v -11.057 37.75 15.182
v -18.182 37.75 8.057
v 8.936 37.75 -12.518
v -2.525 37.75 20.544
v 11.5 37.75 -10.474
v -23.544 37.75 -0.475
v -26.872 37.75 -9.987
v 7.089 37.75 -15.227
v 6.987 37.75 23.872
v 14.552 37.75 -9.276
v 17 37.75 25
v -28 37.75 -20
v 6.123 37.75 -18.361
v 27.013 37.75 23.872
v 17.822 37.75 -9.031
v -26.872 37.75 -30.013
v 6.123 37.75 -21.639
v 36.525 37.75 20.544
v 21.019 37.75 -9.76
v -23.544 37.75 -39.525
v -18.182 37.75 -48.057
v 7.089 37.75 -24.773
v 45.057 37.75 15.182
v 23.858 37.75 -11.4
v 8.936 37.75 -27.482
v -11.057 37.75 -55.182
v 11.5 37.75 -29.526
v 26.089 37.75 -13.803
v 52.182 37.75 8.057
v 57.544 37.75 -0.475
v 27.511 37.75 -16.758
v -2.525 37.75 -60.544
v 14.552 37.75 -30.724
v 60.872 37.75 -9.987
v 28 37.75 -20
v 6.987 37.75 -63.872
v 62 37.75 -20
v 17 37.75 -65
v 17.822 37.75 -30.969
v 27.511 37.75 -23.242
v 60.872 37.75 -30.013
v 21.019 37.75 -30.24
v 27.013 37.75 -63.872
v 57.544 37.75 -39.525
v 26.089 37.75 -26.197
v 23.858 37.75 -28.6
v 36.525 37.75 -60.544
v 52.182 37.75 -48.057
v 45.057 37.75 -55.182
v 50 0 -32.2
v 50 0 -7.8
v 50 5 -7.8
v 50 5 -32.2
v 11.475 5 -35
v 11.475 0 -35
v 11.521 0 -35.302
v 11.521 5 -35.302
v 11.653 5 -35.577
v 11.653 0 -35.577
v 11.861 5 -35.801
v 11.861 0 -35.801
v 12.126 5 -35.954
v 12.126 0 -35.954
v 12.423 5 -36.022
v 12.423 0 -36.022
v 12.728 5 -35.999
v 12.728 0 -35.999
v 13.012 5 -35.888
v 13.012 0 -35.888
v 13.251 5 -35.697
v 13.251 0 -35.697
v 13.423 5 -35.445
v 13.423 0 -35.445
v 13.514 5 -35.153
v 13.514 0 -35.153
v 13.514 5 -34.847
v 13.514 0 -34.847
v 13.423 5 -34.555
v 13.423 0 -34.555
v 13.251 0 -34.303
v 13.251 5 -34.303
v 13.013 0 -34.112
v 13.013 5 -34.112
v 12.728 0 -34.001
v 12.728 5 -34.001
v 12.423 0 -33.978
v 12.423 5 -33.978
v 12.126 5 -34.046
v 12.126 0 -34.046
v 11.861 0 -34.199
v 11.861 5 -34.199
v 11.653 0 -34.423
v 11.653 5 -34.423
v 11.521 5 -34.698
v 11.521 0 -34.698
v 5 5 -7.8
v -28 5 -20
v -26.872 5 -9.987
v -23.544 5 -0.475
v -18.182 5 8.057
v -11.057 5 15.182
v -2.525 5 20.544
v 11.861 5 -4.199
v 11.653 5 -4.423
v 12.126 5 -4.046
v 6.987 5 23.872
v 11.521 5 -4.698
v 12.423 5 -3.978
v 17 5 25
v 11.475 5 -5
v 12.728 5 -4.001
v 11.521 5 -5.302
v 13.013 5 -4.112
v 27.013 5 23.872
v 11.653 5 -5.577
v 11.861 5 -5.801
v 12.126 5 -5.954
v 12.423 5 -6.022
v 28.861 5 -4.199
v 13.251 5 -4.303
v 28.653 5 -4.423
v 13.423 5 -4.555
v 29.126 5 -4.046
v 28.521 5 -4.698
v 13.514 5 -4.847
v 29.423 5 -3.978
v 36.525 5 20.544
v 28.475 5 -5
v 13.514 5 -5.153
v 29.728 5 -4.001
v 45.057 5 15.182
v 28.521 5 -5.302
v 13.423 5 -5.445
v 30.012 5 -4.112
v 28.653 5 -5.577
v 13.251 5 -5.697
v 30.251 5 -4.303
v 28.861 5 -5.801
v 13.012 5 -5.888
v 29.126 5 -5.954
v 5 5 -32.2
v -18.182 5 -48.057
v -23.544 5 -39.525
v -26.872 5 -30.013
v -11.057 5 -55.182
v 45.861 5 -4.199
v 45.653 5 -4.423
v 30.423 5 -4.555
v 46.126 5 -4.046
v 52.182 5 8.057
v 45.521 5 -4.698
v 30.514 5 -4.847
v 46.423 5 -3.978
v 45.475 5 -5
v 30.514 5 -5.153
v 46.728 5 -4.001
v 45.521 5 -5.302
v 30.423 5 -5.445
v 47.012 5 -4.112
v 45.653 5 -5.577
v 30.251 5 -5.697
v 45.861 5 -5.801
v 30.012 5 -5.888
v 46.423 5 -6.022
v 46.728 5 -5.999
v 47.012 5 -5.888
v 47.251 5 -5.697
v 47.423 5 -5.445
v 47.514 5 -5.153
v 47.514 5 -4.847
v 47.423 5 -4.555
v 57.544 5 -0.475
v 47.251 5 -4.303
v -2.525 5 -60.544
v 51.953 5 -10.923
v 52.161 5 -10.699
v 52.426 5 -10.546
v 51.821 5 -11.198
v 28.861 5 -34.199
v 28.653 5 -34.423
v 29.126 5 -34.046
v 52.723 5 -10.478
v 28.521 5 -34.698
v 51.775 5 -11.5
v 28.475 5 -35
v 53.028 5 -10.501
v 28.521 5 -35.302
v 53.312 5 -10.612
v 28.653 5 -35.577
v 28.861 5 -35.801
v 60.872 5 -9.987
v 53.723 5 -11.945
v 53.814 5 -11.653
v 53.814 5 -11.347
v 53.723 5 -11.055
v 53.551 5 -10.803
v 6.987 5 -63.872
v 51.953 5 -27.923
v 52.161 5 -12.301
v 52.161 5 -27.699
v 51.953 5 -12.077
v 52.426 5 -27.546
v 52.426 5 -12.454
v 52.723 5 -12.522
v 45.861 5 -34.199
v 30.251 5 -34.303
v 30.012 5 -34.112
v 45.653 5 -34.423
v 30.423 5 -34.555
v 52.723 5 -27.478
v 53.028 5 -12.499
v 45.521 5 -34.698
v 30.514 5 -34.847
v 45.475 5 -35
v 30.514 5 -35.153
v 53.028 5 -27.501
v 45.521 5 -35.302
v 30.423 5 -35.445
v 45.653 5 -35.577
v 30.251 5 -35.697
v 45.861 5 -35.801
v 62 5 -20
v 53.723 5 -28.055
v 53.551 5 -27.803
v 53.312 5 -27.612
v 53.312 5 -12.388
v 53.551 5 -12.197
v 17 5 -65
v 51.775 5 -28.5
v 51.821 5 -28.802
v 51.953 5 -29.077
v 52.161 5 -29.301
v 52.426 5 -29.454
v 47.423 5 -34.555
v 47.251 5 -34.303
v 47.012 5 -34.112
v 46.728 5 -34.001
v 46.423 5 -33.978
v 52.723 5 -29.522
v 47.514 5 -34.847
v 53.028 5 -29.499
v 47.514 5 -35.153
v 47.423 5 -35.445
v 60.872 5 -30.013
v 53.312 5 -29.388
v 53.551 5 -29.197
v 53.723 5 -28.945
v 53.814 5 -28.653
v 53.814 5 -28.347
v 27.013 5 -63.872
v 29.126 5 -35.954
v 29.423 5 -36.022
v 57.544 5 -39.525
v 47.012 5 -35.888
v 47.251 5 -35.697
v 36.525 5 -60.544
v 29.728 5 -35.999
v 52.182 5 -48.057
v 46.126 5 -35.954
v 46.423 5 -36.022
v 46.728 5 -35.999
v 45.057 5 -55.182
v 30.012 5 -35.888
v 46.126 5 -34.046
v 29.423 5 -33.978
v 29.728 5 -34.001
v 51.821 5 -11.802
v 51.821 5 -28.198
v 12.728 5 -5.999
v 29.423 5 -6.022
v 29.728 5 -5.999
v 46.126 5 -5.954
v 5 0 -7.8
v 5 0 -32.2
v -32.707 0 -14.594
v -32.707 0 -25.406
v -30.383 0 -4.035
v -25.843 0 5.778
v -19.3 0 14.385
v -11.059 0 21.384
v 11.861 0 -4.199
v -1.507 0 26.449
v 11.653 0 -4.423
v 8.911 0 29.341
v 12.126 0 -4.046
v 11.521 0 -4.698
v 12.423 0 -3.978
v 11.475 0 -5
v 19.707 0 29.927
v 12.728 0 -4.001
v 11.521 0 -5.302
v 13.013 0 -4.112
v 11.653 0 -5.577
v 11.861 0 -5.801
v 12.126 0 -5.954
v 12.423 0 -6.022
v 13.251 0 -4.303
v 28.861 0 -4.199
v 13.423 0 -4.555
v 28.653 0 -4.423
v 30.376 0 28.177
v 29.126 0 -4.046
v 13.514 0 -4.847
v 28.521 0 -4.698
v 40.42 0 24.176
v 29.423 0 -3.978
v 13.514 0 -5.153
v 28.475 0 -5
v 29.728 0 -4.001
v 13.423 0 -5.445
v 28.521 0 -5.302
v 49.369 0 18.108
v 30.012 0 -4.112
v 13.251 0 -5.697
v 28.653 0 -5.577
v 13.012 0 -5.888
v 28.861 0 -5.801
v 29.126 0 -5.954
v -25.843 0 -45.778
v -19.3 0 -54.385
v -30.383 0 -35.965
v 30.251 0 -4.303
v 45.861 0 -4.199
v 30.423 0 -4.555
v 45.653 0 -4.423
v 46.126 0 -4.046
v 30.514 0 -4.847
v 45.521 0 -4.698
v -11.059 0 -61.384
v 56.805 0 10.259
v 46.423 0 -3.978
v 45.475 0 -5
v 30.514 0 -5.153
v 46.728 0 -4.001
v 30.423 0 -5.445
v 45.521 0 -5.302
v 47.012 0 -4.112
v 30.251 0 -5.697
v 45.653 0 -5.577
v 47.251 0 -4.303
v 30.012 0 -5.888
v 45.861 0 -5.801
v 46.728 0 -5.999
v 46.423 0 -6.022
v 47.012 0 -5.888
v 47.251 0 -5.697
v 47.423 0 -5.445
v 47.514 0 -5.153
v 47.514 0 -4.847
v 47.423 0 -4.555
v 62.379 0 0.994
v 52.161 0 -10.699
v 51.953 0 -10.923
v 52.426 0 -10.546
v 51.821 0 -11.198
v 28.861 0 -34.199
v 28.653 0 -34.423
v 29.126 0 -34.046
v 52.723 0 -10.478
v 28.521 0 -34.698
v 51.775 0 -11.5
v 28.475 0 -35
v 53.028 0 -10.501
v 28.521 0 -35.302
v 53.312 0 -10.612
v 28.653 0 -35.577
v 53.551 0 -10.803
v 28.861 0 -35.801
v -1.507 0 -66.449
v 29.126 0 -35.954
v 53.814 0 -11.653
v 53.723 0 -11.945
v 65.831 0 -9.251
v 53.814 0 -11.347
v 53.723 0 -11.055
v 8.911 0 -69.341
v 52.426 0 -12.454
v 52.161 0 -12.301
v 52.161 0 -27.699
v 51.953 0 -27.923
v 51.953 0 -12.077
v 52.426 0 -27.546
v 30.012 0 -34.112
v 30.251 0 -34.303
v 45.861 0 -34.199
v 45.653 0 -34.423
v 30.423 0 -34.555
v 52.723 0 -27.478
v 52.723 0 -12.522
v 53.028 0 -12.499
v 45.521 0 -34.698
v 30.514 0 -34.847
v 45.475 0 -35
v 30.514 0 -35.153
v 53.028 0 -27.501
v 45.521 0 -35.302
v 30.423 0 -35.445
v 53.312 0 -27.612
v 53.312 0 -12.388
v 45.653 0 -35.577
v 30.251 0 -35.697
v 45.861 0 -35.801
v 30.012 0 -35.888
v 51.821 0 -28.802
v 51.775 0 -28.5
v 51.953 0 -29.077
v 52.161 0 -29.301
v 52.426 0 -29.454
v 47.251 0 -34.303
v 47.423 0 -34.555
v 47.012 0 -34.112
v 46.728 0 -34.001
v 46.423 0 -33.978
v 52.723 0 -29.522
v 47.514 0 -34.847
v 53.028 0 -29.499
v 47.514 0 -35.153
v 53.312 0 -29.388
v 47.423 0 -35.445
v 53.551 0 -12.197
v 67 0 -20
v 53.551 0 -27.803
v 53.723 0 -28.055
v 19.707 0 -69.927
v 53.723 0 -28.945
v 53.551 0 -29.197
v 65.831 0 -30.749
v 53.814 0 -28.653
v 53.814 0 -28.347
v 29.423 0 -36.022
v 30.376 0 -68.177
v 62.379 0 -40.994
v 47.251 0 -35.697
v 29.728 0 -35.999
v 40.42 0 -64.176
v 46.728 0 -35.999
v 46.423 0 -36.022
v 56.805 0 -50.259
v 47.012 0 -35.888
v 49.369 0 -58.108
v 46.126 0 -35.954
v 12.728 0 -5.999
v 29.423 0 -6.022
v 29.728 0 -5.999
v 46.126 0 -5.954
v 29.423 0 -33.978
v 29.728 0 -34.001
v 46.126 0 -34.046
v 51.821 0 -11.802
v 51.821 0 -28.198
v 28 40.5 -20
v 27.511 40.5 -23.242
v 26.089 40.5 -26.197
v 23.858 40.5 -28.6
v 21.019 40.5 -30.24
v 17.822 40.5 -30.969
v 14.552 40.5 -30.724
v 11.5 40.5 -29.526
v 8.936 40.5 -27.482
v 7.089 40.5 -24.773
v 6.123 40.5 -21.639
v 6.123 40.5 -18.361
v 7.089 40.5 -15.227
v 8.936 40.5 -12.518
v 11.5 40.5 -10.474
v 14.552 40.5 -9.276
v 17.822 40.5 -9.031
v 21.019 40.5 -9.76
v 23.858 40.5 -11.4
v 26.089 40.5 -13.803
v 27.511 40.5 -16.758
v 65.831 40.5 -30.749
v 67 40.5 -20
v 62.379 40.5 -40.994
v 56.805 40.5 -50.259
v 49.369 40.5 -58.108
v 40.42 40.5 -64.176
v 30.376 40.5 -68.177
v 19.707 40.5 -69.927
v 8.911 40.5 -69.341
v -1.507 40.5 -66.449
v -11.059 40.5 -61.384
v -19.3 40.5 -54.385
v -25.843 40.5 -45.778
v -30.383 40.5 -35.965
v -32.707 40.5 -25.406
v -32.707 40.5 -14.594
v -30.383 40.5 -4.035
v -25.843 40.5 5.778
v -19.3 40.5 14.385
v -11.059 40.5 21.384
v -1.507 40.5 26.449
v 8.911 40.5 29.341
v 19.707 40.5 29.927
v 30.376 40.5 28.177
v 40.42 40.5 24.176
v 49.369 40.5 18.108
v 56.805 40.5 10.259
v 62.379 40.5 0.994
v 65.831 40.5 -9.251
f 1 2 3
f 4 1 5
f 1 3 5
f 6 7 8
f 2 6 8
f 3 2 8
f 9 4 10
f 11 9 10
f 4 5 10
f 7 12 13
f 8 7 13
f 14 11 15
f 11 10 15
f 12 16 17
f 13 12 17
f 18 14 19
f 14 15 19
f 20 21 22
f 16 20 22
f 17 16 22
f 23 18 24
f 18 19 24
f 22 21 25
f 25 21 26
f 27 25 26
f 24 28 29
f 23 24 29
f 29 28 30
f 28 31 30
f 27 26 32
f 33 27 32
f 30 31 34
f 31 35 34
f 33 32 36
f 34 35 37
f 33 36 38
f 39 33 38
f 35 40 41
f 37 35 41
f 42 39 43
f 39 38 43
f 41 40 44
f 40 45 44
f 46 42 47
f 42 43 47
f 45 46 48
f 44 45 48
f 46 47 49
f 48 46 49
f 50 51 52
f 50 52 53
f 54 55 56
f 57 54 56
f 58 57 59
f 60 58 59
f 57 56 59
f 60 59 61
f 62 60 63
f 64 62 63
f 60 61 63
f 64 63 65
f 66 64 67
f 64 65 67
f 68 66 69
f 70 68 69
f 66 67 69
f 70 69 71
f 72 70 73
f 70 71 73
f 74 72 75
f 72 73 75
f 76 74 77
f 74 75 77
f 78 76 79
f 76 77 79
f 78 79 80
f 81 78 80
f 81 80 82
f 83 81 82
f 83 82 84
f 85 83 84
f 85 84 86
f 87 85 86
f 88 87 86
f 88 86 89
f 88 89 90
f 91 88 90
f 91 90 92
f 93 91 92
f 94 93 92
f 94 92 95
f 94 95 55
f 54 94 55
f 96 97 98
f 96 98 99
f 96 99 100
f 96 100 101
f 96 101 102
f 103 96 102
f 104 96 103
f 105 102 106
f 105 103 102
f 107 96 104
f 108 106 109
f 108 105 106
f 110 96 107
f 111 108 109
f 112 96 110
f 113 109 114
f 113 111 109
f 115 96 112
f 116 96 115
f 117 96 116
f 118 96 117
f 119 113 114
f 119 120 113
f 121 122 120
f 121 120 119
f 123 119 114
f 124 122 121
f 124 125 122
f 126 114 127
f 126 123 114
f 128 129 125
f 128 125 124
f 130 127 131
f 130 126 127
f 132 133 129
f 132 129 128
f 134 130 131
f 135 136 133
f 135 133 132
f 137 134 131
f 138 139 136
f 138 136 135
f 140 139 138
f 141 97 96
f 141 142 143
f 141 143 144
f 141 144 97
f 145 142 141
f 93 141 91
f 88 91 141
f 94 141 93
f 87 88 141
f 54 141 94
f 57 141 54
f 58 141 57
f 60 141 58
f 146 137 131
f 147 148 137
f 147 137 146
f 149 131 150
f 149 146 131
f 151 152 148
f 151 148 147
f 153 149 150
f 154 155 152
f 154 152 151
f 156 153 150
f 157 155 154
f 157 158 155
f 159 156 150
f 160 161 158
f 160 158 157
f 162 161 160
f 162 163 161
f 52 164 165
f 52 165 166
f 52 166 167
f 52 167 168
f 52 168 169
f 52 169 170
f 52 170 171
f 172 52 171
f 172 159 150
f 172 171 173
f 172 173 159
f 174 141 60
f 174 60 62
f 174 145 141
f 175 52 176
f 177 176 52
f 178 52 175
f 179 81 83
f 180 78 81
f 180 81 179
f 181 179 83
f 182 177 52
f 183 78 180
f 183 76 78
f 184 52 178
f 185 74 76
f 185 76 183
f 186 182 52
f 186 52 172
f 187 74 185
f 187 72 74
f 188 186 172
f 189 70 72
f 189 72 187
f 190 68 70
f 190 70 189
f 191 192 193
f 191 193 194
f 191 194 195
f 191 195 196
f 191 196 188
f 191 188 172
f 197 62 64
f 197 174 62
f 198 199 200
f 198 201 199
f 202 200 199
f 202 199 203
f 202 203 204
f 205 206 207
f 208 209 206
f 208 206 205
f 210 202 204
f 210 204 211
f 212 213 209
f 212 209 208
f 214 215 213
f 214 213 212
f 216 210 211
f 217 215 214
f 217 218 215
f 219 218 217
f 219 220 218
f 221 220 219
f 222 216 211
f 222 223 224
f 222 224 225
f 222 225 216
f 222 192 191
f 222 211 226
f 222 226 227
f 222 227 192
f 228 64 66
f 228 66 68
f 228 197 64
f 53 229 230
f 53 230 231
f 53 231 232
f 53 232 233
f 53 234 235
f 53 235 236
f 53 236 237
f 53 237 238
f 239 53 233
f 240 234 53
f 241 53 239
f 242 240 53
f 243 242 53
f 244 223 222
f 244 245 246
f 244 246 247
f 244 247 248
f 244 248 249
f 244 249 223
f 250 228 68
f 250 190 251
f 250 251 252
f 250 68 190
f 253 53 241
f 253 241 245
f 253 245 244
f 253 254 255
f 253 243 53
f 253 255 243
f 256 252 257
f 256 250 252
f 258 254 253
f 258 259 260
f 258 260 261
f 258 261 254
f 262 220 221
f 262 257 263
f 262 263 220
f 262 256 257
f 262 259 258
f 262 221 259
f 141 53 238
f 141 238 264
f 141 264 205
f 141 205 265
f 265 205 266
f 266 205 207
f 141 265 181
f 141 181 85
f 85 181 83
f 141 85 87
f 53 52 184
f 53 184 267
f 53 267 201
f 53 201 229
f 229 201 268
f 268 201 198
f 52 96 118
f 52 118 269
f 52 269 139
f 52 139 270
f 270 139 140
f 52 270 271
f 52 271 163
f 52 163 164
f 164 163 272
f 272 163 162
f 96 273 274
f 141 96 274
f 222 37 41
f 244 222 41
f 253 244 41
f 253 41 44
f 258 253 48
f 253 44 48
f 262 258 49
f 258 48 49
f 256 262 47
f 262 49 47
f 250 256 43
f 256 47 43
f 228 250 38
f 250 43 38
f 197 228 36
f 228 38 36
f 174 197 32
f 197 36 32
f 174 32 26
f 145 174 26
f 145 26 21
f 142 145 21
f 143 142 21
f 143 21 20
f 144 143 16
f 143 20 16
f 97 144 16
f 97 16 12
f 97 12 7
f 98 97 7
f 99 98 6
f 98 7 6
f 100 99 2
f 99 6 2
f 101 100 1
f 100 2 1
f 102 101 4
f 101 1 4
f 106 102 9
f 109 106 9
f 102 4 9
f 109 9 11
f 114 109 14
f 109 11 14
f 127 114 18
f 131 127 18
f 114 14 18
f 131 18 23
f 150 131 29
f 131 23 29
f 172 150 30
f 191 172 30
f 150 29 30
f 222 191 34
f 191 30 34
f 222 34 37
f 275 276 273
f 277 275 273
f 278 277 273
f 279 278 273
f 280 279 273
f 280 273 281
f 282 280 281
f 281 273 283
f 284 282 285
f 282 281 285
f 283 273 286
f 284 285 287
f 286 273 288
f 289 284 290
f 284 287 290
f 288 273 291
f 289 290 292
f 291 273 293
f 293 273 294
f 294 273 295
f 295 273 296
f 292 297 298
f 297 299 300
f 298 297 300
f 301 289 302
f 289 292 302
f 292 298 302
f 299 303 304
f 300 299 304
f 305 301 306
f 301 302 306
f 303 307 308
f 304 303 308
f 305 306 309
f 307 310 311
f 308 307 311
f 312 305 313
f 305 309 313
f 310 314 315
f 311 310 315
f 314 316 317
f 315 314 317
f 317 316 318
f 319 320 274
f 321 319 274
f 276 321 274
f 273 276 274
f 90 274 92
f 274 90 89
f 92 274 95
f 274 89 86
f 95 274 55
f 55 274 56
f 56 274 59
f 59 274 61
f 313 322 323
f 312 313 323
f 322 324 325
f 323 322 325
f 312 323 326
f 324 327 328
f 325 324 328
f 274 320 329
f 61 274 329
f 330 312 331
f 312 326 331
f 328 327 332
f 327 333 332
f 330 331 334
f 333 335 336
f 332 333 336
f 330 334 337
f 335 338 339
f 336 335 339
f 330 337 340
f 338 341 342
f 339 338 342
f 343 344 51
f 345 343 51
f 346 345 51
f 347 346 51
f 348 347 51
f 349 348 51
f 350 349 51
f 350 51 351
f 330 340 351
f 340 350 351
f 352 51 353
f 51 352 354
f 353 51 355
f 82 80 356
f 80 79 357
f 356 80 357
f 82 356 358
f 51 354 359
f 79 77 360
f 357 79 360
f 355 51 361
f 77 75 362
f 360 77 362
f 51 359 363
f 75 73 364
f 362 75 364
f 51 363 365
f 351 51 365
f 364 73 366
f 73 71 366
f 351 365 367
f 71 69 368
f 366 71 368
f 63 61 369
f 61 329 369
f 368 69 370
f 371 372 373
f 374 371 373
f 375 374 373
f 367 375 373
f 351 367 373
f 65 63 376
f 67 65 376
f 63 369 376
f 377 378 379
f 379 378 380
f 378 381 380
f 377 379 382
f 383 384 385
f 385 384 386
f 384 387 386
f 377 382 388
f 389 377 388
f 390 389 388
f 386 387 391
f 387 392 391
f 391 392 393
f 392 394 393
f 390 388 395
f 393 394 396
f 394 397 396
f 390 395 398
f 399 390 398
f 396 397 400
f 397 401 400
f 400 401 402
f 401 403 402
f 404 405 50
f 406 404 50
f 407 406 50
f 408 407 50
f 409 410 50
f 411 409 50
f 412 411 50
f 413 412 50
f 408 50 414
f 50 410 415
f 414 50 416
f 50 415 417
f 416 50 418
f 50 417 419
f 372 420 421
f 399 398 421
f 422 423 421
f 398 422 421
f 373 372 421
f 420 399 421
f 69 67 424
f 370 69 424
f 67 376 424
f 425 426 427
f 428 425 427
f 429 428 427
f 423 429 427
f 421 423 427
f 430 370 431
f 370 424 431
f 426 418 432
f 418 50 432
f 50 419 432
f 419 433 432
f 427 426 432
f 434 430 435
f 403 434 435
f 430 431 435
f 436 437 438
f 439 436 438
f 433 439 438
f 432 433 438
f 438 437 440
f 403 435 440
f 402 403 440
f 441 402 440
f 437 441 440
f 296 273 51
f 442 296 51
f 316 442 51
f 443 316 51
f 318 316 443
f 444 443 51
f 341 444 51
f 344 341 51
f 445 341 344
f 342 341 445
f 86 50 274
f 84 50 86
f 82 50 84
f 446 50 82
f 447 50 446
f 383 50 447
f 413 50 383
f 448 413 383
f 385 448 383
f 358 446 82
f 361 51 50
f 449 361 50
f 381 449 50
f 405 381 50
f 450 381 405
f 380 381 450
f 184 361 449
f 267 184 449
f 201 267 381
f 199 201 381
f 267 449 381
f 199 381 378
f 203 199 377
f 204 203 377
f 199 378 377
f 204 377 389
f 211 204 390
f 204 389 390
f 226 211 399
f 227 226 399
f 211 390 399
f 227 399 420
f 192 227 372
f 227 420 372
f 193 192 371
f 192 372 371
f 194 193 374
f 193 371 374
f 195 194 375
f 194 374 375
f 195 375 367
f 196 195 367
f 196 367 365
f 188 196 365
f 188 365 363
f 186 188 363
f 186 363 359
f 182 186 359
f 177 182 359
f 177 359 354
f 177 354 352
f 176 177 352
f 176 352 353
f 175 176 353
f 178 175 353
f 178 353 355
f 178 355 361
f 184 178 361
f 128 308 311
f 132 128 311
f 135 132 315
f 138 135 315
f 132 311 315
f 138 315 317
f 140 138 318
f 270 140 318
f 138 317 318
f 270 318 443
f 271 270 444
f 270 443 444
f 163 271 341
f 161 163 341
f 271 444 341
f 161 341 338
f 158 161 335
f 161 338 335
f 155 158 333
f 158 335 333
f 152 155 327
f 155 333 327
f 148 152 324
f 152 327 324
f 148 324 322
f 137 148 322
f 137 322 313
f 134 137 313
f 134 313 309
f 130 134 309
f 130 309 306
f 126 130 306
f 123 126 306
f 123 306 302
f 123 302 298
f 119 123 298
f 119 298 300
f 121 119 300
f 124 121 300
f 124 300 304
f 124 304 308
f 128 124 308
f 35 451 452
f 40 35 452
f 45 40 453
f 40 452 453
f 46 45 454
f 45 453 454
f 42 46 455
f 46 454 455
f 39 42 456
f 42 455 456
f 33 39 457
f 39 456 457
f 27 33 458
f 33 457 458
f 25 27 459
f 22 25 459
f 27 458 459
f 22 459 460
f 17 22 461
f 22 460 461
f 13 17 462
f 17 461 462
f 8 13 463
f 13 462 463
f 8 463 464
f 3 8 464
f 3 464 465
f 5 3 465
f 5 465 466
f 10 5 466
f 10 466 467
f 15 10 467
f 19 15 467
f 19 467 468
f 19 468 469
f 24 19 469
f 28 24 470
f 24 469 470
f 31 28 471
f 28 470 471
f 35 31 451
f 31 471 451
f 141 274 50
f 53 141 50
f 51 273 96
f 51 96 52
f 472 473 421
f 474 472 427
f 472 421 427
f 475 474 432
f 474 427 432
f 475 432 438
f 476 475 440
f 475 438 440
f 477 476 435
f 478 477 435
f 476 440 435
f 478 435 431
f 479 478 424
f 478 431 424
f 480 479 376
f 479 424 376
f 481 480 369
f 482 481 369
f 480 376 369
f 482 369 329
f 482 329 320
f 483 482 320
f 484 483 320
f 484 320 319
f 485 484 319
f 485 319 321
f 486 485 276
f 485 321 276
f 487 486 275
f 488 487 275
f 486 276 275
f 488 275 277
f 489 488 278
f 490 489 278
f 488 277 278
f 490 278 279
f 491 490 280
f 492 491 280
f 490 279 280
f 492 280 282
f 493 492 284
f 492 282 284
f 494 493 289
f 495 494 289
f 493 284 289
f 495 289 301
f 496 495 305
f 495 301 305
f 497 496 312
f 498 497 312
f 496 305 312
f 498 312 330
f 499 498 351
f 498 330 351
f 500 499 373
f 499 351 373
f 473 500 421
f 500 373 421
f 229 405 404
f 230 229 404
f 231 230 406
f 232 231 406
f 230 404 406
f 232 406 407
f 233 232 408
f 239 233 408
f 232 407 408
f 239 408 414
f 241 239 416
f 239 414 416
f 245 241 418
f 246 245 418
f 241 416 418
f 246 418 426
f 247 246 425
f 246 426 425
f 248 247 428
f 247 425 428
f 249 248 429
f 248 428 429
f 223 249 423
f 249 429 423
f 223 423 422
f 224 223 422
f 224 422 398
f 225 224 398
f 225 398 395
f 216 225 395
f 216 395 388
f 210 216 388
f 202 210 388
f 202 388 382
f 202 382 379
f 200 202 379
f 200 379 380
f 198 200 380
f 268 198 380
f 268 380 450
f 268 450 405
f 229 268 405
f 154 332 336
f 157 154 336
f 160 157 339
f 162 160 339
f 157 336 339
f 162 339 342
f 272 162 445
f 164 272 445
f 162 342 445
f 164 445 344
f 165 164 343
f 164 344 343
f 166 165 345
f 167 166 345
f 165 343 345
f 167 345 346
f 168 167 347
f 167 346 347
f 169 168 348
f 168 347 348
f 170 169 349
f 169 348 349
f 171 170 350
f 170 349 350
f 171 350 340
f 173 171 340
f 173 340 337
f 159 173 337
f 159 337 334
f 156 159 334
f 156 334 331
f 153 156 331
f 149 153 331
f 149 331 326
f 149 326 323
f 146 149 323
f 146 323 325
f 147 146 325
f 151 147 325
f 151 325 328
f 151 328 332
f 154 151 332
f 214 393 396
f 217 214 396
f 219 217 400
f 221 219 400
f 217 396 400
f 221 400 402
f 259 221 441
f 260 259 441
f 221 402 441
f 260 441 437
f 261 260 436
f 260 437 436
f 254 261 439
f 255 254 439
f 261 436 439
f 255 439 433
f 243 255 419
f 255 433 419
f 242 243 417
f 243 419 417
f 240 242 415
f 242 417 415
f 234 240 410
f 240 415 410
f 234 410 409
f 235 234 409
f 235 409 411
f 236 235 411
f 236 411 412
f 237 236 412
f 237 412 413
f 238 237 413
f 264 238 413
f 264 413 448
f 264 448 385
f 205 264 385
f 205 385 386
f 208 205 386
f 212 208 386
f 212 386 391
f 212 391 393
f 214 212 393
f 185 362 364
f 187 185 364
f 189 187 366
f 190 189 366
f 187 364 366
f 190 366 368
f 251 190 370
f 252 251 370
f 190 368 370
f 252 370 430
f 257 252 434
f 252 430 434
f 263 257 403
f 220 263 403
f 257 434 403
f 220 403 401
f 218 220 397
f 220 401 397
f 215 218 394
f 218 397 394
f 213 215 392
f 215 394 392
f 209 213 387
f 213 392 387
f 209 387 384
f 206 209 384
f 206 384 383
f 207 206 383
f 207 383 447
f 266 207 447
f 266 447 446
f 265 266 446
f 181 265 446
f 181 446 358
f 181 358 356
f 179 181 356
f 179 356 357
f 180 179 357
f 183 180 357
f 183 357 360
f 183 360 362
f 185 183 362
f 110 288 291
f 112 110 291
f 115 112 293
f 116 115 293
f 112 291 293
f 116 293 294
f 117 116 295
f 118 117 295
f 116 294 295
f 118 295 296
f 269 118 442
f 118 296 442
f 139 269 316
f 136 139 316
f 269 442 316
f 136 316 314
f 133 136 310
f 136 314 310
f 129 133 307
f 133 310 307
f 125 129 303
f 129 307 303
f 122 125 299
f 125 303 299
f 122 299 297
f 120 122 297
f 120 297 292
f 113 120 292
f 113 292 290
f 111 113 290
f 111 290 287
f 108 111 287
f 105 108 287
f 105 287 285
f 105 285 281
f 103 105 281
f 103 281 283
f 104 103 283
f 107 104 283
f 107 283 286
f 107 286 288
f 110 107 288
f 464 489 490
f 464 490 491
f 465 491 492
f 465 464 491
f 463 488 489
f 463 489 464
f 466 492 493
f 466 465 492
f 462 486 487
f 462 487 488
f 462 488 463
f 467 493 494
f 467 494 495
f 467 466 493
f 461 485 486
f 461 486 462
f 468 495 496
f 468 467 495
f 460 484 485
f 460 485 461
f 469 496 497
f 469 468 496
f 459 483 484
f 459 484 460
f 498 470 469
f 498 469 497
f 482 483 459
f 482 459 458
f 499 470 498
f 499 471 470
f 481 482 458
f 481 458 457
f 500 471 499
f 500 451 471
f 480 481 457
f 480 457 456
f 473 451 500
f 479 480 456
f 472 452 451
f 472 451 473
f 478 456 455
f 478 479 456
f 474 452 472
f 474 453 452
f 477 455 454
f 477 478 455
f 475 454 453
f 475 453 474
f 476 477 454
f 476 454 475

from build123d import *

# Parameters (mm, degrees)
SKETCH1_R           = 50
SKETCH1_W           = 60
SKETCH1_H           = 40
SKETCH1_W_2         = 45
SKETCH1_H_2         = 24.4
BOSS_EXTRUDE1_DEPTH = 5
CUT_EXTRUDE1_REACH  = 7
SKETCH8_R           = 1.025
SKETCH9_R           = 50
BOSS_EXTRUDE2_DEPTH = 32.75
SKETCH10_R          = 45
CUT_EXTRUDE2_DEPTH  = 32.75
SKETCH11_R          = 50
BOSS_EXTRUDE3_DEPTH = 2.75
SKETCH12_R          = 11
CUT_EXTRUDE3_DEPTH  = 2.75


with BuildPart() as part:
    # Sketch1 → Boss-Extrude1 (new body)
    with BuildSketch(Plane(origin=(0, 0, 0), x_dir=(1, 0, 0), z_dir=(0, 1, 0))):
        with Locations((17, 20)):
            Circle(SKETCH1_R)
        with Locations((30, 20)):
            Rectangle(SKETCH1_W, SKETCH1_H, mode=Mode.SUBTRACT)
        with Locations((30, 20)):
            Rectangle(SKETCH1_W, SKETCH1_H)
        with Locations((27.5, 20)):
            Rectangle(SKETCH1_W_2, SKETCH1_H_2, mode=Mode.SUBTRACT)
    extrude(amount=BOSS_EXTRUDE1_DEPTH)

    # Sketch8 → Cut-Extrude1 (cut, up to next)
    with BuildSketch(Plane(origin=(0, 0, 0), x_dir=(-1, 0, 0), z_dir=(0, -1, 0)), mode=Mode.PRIVATE) as cut_extrude1_sk1:
        with Locations((-52.8, 28.5)):
            Circle(SKETCH8_R)
    cut_extrude1_tool1 = extrude(cut_extrude1_sk1.sketch, amount=-CUT_EXTRUDE1_REACH, mode=Mode.PRIVATE) & part.part
    add(cut_extrude1_tool1.solids().sort_by_distance((52.8, 0, -28.5))[0], mode=Mode.SUBTRACT)
    # Sketch8 → Cut-Extrude1 (cut, up to next)
    with BuildSketch(Plane(origin=(0, 0, 0), x_dir=(-1, 0, 0), z_dir=(0, -1, 0)), mode=Mode.PRIVATE) as cut_extrude1_sk2:
        with Locations((-46.5, 35)):
            Circle(SKETCH8_R)
    cut_extrude1_tool2 = extrude(cut_extrude1_sk2.sketch, amount=-CUT_EXTRUDE1_REACH, mode=Mode.PRIVATE) & part.part
    add(cut_extrude1_tool2.solids().sort_by_distance((46.5, 0, -35))[0], mode=Mode.SUBTRACT)
    # Sketch8 → Cut-Extrude1 (cut, up to next)
    with BuildSketch(Plane(origin=(0, 0, 0), x_dir=(-1, 0, 0), z_dir=(0, -1, 0)), mode=Mode.PRIVATE) as cut_extrude1_sk3:
        with Locations((-29.5, 35)):
            Circle(SKETCH8_R)
    cut_extrude1_tool3 = extrude(cut_extrude1_sk3.sketch, amount=-CUT_EXTRUDE1_REACH, mode=Mode.PRIVATE) & part.part
    add(cut_extrude1_tool3.solids().sort_by_distance((29.5, 0, -35))[0], mode=Mode.SUBTRACT)
    # Sketch8 → Cut-Extrude1 (cut, up to next)
    with BuildSketch(Plane(origin=(0, 0, 0), x_dir=(-1, 0, 0), z_dir=(0, -1, 0)), mode=Mode.PRIVATE) as cut_extrude1_sk4:
        with Locations((-12.5, 35)):
            Circle(SKETCH8_R)
    cut_extrude1_tool4 = extrude(cut_extrude1_sk4.sketch, amount=-CUT_EXTRUDE1_REACH, mode=Mode.PRIVATE) & part.part
    add(cut_extrude1_tool4.solids().sort_by_distance((12.5, 0, -35))[0], mode=Mode.SUBTRACT)
    # Sketch8 → Cut-Extrude1 (cut, up to next)
    with BuildSketch(Plane(origin=(0, 0, 0), x_dir=(-1, 0, 0), z_dir=(0, -1, 0)), mode=Mode.PRIVATE) as cut_extrude1_sk5:
        with Locations((-12.5, 5)):
            Circle(SKETCH8_R)
    cut_extrude1_tool5 = extrude(cut_extrude1_sk5.sketch, amount=-CUT_EXTRUDE1_REACH, mode=Mode.PRIVATE) & part.part
    add(cut_extrude1_tool5.solids().sort_by_distance((12.5, 0, -5))[0], mode=Mode.SUBTRACT)
    # Sketch8 → Cut-Extrude1 (cut, up to next)
    with BuildSketch(Plane(origin=(0, 0, 0), x_dir=(-1, 0, 0), z_dir=(0, -1, 0)), mode=Mode.PRIVATE) as cut_extrude1_sk6:
        with Locations((-29.5, 5)):
            Circle(SKETCH8_R)
    cut_extrude1_tool6 = extrude(cut_extrude1_sk6.sketch, amount=-CUT_EXTRUDE1_REACH, mode=Mode.PRIVATE) & part.part
    add(cut_extrude1_tool6.solids().sort_by_distance((29.5, 0, -5))[0], mode=Mode.SUBTRACT)
    # Sketch8 → Cut-Extrude1 (cut, up to next)
    with BuildSketch(Plane(origin=(0, 0, 0), x_dir=(-1, 0, 0), z_dir=(0, -1, 0)), mode=Mode.PRIVATE) as cut_extrude1_sk7:
        with Locations((-46.5, 5)):
            Circle(SKETCH8_R)
    cut_extrude1_tool7 = extrude(cut_extrude1_sk7.sketch, amount=-CUT_EXTRUDE1_REACH, mode=Mode.PRIVATE) & part.part
    add(cut_extrude1_tool7.solids().sort_by_distance((46.5, 0, -5))[0], mode=Mode.SUBTRACT)
    # Sketch8 → Cut-Extrude1 (cut, up to next)
    with BuildSketch(Plane(origin=(0, 0, 0), x_dir=(-1, 0, 0), z_dir=(0, -1, 0)), mode=Mode.PRIVATE) as cut_extrude1_sk8:
        with Locations((-52.8, 11.5)):
            Circle(SKETCH8_R)
    cut_extrude1_tool8 = extrude(cut_extrude1_sk8.sketch, amount=-CUT_EXTRUDE1_REACH, mode=Mode.PRIVATE) & part.part
    add(cut_extrude1_tool8.solids().sort_by_distance((52.8, 0, -11.5))[0], mode=Mode.SUBTRACT)

    # Sketch9 → Boss-Extrude2 (add)
    with BuildSketch(Plane(origin=(0, 5, 0), x_dir=(1, 0, 0), z_dir=(0, 1, 0))):
        with Locations((17, 20)):
            Circle(SKETCH9_R)
    extrude(amount=BOSS_EXTRUDE2_DEPTH)

    # Sketch10 → Cut-Extrude2 (cut)
    with BuildSketch(Plane(origin=(0, 37.75, 0), x_dir=(1, 0, 0), z_dir=(0, 1, 0))):
        with Locations((17, 20)):
            Circle(SKETCH10_R)
    extrude(amount=-CUT_EXTRUDE2_DEPTH, mode=Mode.SUBTRACT)

    # Sketch11 → Boss-Extrude3 (add)
    with BuildSketch(Plane(origin=(0, 37.75, 0), x_dir=(1, 0, 0), z_dir=(0, 1, 0))):
        with Locations((17, 20)):
            Circle(SKETCH11_R)
    extrude(amount=BOSS_EXTRUDE3_DEPTH)

    # Sketch12 → Cut-Extrude3 (cut)
    with BuildSketch(Plane(origin=(0, 40.5, 0), x_dir=(1, 0, 0), z_dir=(0, 1, 0))):
        with Locations((17, 20)):
            Circle(SKETCH12_R)
    extrude(amount=-CUT_EXTRUDE3_DEPTH, mode=Mode.SUBTRACT)


solid = part.part
